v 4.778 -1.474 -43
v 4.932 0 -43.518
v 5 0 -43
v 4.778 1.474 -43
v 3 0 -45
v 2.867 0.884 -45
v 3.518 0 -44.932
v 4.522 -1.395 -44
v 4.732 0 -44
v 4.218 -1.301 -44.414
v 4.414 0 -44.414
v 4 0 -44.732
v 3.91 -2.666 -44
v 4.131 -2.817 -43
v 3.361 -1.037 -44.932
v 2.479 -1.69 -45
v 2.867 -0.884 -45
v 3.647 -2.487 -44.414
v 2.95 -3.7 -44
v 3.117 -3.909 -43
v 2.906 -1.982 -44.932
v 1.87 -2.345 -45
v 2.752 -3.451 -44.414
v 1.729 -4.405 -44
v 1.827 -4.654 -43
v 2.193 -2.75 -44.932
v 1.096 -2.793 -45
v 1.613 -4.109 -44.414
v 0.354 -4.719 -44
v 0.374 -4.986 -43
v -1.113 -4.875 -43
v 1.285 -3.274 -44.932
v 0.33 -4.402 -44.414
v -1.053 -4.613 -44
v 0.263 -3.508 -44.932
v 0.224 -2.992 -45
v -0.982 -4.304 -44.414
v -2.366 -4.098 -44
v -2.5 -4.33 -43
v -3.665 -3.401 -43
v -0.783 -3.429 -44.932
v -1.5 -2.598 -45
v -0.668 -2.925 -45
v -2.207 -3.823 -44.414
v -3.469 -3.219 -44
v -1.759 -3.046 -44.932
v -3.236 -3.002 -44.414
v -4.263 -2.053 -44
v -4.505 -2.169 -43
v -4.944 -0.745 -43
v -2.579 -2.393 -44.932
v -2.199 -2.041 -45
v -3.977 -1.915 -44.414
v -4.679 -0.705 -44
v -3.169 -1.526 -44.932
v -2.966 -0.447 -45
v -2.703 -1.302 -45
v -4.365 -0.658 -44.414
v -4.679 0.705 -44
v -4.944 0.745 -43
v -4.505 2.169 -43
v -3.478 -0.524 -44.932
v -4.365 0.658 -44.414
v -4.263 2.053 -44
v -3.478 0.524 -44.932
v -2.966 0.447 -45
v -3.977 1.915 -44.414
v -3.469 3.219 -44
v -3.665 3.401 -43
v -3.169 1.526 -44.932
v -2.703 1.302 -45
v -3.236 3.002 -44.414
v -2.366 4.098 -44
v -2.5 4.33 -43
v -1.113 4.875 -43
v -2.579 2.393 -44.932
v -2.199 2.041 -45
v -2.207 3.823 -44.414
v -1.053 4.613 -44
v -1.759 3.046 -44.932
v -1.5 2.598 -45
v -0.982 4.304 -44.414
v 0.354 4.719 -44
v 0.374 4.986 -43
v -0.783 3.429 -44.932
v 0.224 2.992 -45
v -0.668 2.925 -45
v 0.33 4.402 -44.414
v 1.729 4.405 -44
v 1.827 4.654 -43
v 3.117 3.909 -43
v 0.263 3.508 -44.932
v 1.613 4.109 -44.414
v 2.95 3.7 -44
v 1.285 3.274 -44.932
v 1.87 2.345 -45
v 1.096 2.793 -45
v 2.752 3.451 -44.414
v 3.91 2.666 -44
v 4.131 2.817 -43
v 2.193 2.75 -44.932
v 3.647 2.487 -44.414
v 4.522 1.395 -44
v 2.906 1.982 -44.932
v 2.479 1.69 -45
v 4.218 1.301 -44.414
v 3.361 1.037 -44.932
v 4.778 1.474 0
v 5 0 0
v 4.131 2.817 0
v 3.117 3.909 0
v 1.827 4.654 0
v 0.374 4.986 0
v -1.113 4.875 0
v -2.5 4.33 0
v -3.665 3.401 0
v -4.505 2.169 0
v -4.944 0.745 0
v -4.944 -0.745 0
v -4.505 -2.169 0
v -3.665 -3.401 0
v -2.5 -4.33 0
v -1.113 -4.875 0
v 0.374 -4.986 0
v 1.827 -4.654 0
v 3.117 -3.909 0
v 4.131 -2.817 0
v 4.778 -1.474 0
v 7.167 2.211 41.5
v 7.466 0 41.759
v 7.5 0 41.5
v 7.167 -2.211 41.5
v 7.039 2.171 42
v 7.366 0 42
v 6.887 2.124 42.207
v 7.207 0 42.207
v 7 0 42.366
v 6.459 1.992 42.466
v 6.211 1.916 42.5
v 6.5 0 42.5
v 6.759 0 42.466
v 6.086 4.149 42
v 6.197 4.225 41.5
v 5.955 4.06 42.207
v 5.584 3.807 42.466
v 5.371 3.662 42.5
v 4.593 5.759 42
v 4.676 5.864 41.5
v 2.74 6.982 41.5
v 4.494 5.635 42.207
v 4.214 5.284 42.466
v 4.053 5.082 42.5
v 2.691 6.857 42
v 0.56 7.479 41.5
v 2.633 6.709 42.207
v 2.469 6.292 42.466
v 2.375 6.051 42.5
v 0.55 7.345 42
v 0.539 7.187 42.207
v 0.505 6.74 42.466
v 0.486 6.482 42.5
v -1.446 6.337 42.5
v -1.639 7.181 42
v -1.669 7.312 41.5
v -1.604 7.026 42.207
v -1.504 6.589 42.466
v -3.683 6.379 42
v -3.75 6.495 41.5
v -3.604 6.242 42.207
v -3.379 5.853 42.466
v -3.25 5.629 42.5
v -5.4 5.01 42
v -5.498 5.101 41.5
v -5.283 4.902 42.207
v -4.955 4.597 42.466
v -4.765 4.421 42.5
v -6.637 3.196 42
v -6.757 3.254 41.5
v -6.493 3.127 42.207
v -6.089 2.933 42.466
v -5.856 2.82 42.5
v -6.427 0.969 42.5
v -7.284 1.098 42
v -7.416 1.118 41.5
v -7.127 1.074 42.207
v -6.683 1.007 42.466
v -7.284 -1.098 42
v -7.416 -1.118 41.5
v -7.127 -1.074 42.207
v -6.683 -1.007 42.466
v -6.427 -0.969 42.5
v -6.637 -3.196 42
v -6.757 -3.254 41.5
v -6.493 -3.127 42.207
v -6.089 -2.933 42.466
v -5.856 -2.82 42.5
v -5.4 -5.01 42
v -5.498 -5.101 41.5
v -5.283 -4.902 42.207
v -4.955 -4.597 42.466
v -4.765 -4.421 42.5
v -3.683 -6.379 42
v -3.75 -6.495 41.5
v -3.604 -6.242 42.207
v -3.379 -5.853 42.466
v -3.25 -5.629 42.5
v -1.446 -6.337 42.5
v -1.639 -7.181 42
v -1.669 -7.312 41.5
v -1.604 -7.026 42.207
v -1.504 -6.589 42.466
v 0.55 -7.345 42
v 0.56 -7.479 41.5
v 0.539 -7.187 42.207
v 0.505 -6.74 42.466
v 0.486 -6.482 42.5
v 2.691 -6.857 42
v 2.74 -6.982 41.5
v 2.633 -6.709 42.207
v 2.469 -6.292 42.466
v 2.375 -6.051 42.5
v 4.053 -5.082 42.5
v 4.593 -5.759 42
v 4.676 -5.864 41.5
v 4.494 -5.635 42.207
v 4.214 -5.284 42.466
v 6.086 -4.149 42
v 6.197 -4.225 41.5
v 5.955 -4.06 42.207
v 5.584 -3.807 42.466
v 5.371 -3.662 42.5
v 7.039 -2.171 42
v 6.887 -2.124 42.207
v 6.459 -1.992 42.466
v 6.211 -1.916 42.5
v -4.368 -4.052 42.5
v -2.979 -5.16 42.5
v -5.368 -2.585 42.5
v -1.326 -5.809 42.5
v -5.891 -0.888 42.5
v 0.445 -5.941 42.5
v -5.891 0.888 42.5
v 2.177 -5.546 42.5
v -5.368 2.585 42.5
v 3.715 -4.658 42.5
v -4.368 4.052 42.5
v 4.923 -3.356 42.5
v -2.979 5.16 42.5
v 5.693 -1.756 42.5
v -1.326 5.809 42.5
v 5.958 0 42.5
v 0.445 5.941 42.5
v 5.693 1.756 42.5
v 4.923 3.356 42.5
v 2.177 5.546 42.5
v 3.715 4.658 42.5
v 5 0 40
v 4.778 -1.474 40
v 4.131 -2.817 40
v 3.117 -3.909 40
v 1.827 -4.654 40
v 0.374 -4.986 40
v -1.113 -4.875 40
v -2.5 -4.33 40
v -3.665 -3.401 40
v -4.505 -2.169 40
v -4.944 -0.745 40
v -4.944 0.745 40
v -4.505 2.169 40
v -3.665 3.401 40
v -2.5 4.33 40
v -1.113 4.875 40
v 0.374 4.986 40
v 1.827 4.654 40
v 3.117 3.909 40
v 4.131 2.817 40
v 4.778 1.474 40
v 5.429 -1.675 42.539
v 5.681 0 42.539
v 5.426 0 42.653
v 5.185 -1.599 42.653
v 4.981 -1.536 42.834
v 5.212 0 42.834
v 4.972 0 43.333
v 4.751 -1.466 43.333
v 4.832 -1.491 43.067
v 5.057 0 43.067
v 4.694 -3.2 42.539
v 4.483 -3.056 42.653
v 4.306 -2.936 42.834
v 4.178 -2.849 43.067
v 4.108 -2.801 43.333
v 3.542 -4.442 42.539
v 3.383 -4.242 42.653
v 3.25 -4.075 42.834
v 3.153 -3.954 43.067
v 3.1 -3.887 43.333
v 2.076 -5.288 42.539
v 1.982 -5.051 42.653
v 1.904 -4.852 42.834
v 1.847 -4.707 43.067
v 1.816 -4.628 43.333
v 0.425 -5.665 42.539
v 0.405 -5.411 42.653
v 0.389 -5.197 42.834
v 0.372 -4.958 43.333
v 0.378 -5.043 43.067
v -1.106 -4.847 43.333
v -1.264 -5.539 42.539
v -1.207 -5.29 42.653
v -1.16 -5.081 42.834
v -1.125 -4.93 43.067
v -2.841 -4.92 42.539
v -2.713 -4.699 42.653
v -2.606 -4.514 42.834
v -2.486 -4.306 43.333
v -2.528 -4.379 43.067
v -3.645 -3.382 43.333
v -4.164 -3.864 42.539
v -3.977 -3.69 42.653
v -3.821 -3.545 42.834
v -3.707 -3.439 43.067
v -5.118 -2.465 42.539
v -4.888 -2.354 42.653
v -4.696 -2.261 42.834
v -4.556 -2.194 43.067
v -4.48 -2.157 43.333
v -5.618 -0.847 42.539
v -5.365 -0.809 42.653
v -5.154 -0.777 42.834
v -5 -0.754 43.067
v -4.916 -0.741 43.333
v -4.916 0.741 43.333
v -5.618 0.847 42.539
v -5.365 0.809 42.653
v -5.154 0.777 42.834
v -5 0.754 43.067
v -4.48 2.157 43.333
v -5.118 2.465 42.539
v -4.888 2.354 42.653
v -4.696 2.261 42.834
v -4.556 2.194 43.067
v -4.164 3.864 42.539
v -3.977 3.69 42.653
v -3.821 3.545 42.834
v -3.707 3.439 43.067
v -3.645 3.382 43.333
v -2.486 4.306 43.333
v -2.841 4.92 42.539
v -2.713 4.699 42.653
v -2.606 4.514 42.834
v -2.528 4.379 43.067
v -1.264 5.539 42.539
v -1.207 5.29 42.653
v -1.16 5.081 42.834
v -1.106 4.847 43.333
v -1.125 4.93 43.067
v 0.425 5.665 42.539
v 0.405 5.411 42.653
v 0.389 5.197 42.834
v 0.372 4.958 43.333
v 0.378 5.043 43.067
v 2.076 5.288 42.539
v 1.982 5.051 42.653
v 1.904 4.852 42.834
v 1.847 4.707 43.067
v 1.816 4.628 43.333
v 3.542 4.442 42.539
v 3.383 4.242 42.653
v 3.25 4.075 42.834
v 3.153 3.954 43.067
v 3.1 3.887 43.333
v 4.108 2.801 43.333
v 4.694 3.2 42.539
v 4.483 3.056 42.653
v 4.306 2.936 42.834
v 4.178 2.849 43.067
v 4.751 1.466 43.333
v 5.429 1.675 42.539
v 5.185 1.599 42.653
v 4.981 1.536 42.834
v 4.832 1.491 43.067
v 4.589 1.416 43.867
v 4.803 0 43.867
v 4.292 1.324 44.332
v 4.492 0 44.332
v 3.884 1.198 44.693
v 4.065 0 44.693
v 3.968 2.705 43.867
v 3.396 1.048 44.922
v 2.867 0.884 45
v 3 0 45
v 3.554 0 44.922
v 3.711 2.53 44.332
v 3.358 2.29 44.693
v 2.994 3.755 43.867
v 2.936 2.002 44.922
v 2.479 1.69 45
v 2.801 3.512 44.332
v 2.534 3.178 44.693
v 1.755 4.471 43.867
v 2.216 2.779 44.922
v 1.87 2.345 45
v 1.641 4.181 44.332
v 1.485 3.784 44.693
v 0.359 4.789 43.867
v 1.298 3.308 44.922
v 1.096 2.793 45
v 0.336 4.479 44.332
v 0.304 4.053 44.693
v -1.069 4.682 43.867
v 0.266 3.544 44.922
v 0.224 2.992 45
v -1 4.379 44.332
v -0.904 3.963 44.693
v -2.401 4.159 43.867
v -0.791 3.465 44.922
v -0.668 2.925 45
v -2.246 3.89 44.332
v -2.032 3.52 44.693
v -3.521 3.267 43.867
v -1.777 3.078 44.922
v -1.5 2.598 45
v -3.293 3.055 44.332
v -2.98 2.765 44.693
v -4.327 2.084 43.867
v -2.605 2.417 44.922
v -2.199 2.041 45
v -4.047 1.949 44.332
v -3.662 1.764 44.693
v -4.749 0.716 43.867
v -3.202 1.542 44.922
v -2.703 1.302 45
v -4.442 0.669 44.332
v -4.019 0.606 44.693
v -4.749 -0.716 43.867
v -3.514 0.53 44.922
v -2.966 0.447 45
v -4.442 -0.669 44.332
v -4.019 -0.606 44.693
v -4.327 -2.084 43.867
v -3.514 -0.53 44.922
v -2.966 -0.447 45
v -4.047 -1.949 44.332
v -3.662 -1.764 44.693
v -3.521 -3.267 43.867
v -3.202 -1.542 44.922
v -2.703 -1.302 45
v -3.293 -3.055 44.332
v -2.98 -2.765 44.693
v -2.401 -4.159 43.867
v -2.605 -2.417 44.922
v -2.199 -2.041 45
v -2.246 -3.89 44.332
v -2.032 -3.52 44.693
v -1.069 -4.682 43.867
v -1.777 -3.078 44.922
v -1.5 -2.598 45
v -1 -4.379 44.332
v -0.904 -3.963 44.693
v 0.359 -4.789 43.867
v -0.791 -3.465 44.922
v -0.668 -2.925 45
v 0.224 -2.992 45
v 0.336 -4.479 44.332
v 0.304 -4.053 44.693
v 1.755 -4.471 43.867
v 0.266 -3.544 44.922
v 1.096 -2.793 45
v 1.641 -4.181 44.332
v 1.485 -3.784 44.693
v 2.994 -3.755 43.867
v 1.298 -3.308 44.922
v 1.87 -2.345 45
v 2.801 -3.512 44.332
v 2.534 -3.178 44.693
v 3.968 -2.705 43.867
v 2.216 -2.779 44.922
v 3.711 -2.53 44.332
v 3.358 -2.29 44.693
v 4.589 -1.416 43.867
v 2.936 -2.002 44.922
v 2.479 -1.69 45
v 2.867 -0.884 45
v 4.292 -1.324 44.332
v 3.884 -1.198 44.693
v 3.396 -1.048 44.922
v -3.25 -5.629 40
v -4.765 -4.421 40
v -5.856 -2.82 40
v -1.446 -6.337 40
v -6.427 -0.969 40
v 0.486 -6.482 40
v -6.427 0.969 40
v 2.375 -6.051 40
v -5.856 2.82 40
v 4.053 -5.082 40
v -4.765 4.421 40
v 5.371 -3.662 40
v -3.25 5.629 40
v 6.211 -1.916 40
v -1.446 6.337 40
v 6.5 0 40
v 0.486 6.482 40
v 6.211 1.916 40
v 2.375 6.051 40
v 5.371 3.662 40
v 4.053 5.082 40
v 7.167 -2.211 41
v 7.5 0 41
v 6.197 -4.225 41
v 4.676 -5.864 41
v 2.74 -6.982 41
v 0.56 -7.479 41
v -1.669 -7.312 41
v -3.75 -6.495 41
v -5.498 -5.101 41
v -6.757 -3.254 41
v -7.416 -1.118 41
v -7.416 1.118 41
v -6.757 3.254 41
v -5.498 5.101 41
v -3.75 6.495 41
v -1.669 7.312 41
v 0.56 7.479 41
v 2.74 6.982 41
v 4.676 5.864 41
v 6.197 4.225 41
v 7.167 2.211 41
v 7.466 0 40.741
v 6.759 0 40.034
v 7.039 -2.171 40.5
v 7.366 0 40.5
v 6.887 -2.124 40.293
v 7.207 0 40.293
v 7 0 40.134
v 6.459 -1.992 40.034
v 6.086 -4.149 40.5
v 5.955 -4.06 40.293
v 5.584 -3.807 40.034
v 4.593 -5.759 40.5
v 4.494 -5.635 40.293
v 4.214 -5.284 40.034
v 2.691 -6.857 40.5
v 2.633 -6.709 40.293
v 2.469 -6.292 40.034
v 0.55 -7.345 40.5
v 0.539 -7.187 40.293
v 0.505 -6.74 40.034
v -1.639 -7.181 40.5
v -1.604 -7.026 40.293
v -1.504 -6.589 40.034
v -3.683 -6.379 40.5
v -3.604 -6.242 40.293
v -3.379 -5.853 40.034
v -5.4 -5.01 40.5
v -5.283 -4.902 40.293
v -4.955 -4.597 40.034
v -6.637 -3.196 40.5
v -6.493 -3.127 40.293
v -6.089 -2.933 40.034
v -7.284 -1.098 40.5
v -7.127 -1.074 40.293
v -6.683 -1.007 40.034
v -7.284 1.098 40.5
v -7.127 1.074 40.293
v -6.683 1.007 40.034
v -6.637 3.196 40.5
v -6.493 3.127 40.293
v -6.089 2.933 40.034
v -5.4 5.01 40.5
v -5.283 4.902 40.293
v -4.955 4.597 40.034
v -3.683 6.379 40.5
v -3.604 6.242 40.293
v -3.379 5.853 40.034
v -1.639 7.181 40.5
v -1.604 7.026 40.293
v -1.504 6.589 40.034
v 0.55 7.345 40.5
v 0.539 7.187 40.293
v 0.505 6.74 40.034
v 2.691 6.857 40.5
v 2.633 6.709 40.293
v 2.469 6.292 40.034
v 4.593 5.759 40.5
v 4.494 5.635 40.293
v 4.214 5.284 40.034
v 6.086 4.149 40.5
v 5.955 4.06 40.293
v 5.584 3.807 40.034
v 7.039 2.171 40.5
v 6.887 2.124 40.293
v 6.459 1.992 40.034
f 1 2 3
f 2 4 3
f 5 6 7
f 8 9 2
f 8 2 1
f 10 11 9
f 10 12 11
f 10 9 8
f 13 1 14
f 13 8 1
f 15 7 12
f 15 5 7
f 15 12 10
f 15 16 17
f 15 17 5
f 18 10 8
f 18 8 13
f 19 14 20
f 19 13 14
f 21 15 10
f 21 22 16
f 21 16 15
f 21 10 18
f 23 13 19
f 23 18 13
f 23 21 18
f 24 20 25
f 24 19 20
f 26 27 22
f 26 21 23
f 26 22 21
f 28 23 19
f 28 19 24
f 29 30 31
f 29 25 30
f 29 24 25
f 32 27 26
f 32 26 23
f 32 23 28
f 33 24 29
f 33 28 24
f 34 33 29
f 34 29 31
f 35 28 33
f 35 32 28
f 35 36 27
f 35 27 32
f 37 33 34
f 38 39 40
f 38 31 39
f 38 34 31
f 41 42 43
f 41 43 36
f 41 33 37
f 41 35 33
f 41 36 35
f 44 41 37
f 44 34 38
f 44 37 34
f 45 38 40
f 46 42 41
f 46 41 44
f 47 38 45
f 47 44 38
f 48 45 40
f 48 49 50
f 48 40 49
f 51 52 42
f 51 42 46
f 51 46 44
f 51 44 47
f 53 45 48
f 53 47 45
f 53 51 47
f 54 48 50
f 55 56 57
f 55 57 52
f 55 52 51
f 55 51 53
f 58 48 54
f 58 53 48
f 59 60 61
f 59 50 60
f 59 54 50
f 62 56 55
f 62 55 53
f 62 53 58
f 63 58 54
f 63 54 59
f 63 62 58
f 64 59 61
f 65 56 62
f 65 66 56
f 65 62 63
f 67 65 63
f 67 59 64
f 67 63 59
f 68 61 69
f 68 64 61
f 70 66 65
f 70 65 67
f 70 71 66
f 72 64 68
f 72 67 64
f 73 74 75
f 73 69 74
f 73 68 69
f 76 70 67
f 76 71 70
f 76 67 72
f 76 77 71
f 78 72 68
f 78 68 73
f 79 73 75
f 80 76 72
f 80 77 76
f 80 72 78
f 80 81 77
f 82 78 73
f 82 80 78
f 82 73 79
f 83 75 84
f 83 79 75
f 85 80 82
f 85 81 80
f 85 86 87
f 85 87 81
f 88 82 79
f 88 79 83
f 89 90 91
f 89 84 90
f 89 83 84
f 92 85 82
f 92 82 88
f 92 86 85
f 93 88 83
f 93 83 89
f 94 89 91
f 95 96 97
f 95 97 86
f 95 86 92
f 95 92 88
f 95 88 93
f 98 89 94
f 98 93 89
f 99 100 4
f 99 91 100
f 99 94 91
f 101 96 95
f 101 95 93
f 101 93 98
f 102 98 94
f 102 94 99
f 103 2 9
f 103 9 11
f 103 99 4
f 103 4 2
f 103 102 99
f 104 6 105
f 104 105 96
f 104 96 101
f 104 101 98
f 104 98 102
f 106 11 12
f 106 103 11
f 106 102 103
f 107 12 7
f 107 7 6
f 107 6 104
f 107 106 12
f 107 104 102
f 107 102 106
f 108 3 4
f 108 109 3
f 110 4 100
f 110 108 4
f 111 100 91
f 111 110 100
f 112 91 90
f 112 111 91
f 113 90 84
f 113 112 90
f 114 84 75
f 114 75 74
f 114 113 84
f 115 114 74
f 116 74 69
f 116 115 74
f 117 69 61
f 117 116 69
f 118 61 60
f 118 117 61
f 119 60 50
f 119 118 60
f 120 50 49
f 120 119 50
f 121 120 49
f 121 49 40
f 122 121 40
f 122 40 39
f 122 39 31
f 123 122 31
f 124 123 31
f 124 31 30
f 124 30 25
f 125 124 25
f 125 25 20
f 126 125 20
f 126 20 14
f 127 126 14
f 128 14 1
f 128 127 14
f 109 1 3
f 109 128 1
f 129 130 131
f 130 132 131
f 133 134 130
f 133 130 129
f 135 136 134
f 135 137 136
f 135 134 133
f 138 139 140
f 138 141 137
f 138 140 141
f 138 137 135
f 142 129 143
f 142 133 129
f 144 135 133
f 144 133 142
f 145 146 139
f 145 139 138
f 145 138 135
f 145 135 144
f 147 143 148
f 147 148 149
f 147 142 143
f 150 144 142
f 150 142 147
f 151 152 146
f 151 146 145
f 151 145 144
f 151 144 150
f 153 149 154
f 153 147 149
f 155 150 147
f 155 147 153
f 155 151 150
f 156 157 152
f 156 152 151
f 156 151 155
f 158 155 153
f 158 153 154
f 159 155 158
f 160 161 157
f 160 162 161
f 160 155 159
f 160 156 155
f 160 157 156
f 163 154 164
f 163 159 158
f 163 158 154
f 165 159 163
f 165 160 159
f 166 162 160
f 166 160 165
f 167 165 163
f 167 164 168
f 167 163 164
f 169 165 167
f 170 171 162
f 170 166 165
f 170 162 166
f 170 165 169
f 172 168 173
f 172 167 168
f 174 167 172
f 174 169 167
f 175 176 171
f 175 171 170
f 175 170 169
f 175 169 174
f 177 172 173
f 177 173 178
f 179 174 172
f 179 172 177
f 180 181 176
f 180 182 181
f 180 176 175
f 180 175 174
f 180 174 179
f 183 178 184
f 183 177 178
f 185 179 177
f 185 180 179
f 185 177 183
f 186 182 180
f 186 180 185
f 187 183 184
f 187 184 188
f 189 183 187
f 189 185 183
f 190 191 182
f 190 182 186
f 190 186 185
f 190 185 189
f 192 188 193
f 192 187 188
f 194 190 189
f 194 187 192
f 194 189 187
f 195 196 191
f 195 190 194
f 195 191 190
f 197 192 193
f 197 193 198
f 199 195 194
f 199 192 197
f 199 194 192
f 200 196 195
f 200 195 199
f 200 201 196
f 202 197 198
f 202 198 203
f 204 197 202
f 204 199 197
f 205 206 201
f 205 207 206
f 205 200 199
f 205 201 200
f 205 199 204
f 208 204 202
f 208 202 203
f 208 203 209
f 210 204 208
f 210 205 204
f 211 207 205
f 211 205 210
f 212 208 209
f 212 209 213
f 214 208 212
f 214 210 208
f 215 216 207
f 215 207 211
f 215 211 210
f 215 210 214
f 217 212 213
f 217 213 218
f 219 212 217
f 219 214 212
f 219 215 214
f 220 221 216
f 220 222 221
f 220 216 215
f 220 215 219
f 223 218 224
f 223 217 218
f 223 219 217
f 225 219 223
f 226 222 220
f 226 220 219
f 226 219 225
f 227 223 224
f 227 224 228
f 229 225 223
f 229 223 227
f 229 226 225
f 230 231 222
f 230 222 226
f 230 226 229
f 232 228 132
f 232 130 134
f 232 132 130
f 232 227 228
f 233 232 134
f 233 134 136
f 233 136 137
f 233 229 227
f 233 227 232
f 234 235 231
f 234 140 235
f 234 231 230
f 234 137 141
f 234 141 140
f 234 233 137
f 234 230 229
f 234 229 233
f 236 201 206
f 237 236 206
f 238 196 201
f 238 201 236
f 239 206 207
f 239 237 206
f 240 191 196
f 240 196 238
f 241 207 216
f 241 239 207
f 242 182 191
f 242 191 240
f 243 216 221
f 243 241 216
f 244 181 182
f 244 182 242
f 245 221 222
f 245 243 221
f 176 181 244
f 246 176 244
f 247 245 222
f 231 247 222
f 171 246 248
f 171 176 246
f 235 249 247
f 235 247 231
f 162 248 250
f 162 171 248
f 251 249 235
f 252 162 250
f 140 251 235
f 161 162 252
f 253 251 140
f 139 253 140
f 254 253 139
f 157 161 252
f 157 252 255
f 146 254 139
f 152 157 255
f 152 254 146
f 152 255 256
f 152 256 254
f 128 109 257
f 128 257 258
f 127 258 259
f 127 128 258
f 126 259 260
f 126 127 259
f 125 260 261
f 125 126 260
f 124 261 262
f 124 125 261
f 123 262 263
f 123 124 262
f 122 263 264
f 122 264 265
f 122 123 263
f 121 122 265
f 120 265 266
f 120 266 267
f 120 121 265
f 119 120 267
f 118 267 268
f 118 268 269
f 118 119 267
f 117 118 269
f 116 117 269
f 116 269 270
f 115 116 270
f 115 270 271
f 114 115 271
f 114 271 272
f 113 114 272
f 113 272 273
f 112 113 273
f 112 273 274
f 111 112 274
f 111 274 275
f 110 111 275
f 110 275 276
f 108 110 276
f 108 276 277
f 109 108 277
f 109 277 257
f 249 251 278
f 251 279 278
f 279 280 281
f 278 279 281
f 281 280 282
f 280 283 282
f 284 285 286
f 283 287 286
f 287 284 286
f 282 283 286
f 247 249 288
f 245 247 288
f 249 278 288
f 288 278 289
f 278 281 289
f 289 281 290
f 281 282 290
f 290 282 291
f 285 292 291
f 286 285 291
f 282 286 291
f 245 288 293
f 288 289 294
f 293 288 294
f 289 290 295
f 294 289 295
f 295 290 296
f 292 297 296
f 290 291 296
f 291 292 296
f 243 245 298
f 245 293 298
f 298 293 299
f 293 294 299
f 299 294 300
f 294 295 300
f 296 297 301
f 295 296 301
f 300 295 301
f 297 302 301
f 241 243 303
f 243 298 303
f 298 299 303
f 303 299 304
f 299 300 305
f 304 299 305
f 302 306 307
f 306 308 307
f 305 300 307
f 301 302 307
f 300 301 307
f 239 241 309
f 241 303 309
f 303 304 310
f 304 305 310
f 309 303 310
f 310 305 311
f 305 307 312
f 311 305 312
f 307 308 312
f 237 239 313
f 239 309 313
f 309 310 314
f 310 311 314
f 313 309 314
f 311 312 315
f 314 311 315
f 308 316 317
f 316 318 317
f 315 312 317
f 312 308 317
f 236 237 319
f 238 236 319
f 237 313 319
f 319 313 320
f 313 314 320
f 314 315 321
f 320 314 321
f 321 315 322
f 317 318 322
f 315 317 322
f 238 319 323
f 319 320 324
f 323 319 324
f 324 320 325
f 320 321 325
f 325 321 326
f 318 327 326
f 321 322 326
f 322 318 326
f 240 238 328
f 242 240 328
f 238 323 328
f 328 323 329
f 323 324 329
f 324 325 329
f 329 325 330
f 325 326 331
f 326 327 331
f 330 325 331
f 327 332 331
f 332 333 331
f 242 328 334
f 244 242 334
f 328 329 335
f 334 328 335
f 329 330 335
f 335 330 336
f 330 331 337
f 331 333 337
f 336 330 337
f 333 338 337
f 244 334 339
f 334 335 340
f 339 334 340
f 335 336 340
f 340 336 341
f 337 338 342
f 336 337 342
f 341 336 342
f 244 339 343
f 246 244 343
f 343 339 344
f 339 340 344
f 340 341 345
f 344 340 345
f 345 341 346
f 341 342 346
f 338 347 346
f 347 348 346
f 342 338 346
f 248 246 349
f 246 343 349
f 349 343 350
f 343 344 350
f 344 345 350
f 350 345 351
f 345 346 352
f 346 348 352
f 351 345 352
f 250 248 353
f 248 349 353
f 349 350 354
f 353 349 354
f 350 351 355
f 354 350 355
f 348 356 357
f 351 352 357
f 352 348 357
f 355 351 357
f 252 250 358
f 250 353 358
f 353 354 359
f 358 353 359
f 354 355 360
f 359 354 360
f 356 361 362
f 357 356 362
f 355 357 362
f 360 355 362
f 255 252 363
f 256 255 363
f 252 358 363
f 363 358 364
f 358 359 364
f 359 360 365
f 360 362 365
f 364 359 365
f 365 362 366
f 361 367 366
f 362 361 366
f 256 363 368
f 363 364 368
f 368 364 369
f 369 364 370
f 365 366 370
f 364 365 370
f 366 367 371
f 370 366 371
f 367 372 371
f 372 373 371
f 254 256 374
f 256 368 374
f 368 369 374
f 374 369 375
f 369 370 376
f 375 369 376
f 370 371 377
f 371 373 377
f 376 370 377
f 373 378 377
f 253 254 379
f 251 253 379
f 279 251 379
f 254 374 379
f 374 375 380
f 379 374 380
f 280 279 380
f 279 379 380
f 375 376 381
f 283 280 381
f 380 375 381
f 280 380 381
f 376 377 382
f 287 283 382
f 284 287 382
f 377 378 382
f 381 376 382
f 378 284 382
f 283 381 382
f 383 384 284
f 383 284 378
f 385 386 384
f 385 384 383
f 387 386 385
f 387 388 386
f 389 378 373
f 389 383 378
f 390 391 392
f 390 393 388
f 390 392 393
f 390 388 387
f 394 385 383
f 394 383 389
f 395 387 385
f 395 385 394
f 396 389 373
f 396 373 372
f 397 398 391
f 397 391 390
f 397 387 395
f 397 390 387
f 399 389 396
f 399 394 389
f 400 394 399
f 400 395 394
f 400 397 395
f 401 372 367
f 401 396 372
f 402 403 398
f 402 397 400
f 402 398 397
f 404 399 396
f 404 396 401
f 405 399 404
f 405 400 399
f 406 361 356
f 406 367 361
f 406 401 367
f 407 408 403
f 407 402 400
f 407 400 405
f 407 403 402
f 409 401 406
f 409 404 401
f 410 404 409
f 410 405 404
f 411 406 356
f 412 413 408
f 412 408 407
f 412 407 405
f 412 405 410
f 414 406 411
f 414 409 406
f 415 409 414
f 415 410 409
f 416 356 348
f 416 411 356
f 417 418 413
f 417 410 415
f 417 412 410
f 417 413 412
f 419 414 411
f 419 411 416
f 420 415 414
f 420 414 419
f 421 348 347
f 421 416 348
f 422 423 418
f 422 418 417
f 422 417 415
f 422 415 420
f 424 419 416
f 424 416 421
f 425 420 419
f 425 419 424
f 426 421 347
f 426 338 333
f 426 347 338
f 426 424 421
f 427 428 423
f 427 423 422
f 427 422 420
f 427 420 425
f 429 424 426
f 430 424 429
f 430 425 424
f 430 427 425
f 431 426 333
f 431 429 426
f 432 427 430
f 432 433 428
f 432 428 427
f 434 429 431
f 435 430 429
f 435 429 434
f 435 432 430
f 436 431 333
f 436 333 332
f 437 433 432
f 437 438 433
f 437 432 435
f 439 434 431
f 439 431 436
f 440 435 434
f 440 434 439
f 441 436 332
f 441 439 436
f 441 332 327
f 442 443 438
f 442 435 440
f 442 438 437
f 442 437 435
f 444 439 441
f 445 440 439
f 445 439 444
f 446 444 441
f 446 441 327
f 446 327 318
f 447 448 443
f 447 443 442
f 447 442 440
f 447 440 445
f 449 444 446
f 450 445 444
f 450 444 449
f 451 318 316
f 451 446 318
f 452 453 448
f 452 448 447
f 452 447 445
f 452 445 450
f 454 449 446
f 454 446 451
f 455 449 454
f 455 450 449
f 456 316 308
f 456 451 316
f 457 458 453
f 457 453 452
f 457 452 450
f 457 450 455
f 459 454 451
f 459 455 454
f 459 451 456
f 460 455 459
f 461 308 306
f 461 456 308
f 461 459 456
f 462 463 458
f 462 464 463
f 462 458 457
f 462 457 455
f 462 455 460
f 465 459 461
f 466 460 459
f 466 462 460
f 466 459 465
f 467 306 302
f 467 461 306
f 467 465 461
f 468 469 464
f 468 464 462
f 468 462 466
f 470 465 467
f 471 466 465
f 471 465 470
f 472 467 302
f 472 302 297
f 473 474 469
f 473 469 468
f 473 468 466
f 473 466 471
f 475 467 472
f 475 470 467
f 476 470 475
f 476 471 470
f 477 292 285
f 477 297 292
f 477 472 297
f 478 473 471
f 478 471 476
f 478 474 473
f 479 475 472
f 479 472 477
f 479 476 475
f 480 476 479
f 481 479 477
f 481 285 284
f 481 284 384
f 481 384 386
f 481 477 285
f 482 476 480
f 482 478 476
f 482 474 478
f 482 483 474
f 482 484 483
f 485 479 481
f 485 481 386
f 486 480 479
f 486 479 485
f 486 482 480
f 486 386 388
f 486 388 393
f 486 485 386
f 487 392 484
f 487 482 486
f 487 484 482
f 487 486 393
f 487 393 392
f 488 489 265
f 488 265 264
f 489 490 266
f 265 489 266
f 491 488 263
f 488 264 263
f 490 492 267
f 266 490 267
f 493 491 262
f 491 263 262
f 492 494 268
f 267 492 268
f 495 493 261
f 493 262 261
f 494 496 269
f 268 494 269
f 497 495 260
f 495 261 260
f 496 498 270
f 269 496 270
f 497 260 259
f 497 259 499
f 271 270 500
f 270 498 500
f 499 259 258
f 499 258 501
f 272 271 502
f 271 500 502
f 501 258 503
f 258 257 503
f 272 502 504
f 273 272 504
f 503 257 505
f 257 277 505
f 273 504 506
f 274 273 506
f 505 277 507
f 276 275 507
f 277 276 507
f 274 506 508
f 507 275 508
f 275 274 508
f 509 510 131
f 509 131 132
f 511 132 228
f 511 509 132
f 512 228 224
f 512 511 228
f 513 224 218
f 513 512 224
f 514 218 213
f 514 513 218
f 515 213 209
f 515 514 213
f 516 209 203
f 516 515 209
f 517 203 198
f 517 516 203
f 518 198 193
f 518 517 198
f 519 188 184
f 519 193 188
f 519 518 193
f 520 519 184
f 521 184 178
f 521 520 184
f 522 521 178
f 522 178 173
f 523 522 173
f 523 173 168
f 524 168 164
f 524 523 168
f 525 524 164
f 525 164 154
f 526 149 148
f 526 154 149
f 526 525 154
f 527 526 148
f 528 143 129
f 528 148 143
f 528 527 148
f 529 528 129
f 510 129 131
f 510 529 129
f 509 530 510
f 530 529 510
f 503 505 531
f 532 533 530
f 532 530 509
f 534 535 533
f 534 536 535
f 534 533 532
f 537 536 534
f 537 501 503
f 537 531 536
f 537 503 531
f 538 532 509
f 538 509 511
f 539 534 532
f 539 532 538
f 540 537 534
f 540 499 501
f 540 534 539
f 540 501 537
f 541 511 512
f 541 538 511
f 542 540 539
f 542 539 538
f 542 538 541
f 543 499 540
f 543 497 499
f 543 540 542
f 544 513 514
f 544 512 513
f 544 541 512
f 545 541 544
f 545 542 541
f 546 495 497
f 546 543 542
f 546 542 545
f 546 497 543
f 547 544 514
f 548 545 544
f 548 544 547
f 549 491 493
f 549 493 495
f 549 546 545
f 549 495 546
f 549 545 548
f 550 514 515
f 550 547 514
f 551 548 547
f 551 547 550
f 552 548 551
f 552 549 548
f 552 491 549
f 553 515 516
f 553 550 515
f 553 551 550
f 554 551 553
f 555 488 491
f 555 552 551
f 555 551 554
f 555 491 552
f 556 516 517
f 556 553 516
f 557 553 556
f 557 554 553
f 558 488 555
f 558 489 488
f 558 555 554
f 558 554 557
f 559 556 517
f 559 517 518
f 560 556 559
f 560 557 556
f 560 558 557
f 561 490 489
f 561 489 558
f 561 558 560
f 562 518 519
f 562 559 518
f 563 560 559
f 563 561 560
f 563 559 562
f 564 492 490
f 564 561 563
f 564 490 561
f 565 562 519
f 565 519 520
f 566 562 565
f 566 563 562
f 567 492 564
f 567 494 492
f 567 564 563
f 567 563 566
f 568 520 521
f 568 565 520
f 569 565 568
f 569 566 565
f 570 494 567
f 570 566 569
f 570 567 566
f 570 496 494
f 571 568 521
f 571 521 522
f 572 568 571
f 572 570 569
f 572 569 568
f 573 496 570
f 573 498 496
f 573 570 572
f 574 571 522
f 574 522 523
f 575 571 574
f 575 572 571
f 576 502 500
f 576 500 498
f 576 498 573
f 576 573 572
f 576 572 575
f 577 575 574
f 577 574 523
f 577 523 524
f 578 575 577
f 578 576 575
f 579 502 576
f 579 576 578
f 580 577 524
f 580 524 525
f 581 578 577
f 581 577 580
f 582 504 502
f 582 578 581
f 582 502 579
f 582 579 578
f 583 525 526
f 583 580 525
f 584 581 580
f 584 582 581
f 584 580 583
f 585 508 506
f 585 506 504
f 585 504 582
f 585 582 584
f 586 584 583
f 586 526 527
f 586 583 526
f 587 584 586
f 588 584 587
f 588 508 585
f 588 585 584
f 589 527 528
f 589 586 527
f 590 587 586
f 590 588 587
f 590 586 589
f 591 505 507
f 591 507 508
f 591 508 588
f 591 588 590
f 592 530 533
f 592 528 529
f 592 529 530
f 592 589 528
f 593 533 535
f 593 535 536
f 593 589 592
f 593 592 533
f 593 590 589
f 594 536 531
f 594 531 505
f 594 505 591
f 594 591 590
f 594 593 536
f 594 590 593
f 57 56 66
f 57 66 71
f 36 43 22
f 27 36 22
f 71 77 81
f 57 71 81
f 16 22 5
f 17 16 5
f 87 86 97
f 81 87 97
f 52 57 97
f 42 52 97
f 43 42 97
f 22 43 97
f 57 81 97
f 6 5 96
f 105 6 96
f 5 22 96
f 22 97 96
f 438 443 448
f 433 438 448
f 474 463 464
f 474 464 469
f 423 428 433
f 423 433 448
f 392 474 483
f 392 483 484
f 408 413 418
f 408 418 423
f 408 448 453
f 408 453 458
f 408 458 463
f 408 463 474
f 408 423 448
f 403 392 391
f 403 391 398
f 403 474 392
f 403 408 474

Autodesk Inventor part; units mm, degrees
ref_plane "YZ Plane" through (0, 0, 0) normal (1, 0, 0) x (0, 1, 0)
ref_plane "XZ Plane" through (0, 0, 0) normal (0, 1, 0) x (-1, 0, 0)
sketch "Sketch1" plane through (0, 0, 0) normal (0, 0, 1) x (1, 0, 0)
  circle A0 centre (0, 0) radius 5
  dimension "d0" = 10
extrude "Extrusion1" add sketch "Sketch1" along normal mid plane 90
fillet "Fillet1" radius 2 1 edges at (-5, 0, 45)
fillet "Fillet2" radius 2 1 edges at (-5, 0, -45)
ref_plane "Work Plane1" through (0, 0, 40) normal (0, 0, 1) x (1, 0, 0)
sketch "Sketch2" plane through (0, 0, 40) normal (0, 0, 1) x (1, 0, 0)
  circle A0 centre (0, 0) radius 3 projected
  circle A1 centre (0, 0) radius 7.5
  dimension "d6" = 15
extrude "Extrusion2" add sketch "Sketch2" along normal blind 2.5
fillet "Fillet3" radius 1 2 edges at (-7.5, 0, 42.5) (-7.5, 0, 40)
fillet "Fillet4" radius 1 1 edges at (-5, 0, 42.5)
properties part number "panda"
